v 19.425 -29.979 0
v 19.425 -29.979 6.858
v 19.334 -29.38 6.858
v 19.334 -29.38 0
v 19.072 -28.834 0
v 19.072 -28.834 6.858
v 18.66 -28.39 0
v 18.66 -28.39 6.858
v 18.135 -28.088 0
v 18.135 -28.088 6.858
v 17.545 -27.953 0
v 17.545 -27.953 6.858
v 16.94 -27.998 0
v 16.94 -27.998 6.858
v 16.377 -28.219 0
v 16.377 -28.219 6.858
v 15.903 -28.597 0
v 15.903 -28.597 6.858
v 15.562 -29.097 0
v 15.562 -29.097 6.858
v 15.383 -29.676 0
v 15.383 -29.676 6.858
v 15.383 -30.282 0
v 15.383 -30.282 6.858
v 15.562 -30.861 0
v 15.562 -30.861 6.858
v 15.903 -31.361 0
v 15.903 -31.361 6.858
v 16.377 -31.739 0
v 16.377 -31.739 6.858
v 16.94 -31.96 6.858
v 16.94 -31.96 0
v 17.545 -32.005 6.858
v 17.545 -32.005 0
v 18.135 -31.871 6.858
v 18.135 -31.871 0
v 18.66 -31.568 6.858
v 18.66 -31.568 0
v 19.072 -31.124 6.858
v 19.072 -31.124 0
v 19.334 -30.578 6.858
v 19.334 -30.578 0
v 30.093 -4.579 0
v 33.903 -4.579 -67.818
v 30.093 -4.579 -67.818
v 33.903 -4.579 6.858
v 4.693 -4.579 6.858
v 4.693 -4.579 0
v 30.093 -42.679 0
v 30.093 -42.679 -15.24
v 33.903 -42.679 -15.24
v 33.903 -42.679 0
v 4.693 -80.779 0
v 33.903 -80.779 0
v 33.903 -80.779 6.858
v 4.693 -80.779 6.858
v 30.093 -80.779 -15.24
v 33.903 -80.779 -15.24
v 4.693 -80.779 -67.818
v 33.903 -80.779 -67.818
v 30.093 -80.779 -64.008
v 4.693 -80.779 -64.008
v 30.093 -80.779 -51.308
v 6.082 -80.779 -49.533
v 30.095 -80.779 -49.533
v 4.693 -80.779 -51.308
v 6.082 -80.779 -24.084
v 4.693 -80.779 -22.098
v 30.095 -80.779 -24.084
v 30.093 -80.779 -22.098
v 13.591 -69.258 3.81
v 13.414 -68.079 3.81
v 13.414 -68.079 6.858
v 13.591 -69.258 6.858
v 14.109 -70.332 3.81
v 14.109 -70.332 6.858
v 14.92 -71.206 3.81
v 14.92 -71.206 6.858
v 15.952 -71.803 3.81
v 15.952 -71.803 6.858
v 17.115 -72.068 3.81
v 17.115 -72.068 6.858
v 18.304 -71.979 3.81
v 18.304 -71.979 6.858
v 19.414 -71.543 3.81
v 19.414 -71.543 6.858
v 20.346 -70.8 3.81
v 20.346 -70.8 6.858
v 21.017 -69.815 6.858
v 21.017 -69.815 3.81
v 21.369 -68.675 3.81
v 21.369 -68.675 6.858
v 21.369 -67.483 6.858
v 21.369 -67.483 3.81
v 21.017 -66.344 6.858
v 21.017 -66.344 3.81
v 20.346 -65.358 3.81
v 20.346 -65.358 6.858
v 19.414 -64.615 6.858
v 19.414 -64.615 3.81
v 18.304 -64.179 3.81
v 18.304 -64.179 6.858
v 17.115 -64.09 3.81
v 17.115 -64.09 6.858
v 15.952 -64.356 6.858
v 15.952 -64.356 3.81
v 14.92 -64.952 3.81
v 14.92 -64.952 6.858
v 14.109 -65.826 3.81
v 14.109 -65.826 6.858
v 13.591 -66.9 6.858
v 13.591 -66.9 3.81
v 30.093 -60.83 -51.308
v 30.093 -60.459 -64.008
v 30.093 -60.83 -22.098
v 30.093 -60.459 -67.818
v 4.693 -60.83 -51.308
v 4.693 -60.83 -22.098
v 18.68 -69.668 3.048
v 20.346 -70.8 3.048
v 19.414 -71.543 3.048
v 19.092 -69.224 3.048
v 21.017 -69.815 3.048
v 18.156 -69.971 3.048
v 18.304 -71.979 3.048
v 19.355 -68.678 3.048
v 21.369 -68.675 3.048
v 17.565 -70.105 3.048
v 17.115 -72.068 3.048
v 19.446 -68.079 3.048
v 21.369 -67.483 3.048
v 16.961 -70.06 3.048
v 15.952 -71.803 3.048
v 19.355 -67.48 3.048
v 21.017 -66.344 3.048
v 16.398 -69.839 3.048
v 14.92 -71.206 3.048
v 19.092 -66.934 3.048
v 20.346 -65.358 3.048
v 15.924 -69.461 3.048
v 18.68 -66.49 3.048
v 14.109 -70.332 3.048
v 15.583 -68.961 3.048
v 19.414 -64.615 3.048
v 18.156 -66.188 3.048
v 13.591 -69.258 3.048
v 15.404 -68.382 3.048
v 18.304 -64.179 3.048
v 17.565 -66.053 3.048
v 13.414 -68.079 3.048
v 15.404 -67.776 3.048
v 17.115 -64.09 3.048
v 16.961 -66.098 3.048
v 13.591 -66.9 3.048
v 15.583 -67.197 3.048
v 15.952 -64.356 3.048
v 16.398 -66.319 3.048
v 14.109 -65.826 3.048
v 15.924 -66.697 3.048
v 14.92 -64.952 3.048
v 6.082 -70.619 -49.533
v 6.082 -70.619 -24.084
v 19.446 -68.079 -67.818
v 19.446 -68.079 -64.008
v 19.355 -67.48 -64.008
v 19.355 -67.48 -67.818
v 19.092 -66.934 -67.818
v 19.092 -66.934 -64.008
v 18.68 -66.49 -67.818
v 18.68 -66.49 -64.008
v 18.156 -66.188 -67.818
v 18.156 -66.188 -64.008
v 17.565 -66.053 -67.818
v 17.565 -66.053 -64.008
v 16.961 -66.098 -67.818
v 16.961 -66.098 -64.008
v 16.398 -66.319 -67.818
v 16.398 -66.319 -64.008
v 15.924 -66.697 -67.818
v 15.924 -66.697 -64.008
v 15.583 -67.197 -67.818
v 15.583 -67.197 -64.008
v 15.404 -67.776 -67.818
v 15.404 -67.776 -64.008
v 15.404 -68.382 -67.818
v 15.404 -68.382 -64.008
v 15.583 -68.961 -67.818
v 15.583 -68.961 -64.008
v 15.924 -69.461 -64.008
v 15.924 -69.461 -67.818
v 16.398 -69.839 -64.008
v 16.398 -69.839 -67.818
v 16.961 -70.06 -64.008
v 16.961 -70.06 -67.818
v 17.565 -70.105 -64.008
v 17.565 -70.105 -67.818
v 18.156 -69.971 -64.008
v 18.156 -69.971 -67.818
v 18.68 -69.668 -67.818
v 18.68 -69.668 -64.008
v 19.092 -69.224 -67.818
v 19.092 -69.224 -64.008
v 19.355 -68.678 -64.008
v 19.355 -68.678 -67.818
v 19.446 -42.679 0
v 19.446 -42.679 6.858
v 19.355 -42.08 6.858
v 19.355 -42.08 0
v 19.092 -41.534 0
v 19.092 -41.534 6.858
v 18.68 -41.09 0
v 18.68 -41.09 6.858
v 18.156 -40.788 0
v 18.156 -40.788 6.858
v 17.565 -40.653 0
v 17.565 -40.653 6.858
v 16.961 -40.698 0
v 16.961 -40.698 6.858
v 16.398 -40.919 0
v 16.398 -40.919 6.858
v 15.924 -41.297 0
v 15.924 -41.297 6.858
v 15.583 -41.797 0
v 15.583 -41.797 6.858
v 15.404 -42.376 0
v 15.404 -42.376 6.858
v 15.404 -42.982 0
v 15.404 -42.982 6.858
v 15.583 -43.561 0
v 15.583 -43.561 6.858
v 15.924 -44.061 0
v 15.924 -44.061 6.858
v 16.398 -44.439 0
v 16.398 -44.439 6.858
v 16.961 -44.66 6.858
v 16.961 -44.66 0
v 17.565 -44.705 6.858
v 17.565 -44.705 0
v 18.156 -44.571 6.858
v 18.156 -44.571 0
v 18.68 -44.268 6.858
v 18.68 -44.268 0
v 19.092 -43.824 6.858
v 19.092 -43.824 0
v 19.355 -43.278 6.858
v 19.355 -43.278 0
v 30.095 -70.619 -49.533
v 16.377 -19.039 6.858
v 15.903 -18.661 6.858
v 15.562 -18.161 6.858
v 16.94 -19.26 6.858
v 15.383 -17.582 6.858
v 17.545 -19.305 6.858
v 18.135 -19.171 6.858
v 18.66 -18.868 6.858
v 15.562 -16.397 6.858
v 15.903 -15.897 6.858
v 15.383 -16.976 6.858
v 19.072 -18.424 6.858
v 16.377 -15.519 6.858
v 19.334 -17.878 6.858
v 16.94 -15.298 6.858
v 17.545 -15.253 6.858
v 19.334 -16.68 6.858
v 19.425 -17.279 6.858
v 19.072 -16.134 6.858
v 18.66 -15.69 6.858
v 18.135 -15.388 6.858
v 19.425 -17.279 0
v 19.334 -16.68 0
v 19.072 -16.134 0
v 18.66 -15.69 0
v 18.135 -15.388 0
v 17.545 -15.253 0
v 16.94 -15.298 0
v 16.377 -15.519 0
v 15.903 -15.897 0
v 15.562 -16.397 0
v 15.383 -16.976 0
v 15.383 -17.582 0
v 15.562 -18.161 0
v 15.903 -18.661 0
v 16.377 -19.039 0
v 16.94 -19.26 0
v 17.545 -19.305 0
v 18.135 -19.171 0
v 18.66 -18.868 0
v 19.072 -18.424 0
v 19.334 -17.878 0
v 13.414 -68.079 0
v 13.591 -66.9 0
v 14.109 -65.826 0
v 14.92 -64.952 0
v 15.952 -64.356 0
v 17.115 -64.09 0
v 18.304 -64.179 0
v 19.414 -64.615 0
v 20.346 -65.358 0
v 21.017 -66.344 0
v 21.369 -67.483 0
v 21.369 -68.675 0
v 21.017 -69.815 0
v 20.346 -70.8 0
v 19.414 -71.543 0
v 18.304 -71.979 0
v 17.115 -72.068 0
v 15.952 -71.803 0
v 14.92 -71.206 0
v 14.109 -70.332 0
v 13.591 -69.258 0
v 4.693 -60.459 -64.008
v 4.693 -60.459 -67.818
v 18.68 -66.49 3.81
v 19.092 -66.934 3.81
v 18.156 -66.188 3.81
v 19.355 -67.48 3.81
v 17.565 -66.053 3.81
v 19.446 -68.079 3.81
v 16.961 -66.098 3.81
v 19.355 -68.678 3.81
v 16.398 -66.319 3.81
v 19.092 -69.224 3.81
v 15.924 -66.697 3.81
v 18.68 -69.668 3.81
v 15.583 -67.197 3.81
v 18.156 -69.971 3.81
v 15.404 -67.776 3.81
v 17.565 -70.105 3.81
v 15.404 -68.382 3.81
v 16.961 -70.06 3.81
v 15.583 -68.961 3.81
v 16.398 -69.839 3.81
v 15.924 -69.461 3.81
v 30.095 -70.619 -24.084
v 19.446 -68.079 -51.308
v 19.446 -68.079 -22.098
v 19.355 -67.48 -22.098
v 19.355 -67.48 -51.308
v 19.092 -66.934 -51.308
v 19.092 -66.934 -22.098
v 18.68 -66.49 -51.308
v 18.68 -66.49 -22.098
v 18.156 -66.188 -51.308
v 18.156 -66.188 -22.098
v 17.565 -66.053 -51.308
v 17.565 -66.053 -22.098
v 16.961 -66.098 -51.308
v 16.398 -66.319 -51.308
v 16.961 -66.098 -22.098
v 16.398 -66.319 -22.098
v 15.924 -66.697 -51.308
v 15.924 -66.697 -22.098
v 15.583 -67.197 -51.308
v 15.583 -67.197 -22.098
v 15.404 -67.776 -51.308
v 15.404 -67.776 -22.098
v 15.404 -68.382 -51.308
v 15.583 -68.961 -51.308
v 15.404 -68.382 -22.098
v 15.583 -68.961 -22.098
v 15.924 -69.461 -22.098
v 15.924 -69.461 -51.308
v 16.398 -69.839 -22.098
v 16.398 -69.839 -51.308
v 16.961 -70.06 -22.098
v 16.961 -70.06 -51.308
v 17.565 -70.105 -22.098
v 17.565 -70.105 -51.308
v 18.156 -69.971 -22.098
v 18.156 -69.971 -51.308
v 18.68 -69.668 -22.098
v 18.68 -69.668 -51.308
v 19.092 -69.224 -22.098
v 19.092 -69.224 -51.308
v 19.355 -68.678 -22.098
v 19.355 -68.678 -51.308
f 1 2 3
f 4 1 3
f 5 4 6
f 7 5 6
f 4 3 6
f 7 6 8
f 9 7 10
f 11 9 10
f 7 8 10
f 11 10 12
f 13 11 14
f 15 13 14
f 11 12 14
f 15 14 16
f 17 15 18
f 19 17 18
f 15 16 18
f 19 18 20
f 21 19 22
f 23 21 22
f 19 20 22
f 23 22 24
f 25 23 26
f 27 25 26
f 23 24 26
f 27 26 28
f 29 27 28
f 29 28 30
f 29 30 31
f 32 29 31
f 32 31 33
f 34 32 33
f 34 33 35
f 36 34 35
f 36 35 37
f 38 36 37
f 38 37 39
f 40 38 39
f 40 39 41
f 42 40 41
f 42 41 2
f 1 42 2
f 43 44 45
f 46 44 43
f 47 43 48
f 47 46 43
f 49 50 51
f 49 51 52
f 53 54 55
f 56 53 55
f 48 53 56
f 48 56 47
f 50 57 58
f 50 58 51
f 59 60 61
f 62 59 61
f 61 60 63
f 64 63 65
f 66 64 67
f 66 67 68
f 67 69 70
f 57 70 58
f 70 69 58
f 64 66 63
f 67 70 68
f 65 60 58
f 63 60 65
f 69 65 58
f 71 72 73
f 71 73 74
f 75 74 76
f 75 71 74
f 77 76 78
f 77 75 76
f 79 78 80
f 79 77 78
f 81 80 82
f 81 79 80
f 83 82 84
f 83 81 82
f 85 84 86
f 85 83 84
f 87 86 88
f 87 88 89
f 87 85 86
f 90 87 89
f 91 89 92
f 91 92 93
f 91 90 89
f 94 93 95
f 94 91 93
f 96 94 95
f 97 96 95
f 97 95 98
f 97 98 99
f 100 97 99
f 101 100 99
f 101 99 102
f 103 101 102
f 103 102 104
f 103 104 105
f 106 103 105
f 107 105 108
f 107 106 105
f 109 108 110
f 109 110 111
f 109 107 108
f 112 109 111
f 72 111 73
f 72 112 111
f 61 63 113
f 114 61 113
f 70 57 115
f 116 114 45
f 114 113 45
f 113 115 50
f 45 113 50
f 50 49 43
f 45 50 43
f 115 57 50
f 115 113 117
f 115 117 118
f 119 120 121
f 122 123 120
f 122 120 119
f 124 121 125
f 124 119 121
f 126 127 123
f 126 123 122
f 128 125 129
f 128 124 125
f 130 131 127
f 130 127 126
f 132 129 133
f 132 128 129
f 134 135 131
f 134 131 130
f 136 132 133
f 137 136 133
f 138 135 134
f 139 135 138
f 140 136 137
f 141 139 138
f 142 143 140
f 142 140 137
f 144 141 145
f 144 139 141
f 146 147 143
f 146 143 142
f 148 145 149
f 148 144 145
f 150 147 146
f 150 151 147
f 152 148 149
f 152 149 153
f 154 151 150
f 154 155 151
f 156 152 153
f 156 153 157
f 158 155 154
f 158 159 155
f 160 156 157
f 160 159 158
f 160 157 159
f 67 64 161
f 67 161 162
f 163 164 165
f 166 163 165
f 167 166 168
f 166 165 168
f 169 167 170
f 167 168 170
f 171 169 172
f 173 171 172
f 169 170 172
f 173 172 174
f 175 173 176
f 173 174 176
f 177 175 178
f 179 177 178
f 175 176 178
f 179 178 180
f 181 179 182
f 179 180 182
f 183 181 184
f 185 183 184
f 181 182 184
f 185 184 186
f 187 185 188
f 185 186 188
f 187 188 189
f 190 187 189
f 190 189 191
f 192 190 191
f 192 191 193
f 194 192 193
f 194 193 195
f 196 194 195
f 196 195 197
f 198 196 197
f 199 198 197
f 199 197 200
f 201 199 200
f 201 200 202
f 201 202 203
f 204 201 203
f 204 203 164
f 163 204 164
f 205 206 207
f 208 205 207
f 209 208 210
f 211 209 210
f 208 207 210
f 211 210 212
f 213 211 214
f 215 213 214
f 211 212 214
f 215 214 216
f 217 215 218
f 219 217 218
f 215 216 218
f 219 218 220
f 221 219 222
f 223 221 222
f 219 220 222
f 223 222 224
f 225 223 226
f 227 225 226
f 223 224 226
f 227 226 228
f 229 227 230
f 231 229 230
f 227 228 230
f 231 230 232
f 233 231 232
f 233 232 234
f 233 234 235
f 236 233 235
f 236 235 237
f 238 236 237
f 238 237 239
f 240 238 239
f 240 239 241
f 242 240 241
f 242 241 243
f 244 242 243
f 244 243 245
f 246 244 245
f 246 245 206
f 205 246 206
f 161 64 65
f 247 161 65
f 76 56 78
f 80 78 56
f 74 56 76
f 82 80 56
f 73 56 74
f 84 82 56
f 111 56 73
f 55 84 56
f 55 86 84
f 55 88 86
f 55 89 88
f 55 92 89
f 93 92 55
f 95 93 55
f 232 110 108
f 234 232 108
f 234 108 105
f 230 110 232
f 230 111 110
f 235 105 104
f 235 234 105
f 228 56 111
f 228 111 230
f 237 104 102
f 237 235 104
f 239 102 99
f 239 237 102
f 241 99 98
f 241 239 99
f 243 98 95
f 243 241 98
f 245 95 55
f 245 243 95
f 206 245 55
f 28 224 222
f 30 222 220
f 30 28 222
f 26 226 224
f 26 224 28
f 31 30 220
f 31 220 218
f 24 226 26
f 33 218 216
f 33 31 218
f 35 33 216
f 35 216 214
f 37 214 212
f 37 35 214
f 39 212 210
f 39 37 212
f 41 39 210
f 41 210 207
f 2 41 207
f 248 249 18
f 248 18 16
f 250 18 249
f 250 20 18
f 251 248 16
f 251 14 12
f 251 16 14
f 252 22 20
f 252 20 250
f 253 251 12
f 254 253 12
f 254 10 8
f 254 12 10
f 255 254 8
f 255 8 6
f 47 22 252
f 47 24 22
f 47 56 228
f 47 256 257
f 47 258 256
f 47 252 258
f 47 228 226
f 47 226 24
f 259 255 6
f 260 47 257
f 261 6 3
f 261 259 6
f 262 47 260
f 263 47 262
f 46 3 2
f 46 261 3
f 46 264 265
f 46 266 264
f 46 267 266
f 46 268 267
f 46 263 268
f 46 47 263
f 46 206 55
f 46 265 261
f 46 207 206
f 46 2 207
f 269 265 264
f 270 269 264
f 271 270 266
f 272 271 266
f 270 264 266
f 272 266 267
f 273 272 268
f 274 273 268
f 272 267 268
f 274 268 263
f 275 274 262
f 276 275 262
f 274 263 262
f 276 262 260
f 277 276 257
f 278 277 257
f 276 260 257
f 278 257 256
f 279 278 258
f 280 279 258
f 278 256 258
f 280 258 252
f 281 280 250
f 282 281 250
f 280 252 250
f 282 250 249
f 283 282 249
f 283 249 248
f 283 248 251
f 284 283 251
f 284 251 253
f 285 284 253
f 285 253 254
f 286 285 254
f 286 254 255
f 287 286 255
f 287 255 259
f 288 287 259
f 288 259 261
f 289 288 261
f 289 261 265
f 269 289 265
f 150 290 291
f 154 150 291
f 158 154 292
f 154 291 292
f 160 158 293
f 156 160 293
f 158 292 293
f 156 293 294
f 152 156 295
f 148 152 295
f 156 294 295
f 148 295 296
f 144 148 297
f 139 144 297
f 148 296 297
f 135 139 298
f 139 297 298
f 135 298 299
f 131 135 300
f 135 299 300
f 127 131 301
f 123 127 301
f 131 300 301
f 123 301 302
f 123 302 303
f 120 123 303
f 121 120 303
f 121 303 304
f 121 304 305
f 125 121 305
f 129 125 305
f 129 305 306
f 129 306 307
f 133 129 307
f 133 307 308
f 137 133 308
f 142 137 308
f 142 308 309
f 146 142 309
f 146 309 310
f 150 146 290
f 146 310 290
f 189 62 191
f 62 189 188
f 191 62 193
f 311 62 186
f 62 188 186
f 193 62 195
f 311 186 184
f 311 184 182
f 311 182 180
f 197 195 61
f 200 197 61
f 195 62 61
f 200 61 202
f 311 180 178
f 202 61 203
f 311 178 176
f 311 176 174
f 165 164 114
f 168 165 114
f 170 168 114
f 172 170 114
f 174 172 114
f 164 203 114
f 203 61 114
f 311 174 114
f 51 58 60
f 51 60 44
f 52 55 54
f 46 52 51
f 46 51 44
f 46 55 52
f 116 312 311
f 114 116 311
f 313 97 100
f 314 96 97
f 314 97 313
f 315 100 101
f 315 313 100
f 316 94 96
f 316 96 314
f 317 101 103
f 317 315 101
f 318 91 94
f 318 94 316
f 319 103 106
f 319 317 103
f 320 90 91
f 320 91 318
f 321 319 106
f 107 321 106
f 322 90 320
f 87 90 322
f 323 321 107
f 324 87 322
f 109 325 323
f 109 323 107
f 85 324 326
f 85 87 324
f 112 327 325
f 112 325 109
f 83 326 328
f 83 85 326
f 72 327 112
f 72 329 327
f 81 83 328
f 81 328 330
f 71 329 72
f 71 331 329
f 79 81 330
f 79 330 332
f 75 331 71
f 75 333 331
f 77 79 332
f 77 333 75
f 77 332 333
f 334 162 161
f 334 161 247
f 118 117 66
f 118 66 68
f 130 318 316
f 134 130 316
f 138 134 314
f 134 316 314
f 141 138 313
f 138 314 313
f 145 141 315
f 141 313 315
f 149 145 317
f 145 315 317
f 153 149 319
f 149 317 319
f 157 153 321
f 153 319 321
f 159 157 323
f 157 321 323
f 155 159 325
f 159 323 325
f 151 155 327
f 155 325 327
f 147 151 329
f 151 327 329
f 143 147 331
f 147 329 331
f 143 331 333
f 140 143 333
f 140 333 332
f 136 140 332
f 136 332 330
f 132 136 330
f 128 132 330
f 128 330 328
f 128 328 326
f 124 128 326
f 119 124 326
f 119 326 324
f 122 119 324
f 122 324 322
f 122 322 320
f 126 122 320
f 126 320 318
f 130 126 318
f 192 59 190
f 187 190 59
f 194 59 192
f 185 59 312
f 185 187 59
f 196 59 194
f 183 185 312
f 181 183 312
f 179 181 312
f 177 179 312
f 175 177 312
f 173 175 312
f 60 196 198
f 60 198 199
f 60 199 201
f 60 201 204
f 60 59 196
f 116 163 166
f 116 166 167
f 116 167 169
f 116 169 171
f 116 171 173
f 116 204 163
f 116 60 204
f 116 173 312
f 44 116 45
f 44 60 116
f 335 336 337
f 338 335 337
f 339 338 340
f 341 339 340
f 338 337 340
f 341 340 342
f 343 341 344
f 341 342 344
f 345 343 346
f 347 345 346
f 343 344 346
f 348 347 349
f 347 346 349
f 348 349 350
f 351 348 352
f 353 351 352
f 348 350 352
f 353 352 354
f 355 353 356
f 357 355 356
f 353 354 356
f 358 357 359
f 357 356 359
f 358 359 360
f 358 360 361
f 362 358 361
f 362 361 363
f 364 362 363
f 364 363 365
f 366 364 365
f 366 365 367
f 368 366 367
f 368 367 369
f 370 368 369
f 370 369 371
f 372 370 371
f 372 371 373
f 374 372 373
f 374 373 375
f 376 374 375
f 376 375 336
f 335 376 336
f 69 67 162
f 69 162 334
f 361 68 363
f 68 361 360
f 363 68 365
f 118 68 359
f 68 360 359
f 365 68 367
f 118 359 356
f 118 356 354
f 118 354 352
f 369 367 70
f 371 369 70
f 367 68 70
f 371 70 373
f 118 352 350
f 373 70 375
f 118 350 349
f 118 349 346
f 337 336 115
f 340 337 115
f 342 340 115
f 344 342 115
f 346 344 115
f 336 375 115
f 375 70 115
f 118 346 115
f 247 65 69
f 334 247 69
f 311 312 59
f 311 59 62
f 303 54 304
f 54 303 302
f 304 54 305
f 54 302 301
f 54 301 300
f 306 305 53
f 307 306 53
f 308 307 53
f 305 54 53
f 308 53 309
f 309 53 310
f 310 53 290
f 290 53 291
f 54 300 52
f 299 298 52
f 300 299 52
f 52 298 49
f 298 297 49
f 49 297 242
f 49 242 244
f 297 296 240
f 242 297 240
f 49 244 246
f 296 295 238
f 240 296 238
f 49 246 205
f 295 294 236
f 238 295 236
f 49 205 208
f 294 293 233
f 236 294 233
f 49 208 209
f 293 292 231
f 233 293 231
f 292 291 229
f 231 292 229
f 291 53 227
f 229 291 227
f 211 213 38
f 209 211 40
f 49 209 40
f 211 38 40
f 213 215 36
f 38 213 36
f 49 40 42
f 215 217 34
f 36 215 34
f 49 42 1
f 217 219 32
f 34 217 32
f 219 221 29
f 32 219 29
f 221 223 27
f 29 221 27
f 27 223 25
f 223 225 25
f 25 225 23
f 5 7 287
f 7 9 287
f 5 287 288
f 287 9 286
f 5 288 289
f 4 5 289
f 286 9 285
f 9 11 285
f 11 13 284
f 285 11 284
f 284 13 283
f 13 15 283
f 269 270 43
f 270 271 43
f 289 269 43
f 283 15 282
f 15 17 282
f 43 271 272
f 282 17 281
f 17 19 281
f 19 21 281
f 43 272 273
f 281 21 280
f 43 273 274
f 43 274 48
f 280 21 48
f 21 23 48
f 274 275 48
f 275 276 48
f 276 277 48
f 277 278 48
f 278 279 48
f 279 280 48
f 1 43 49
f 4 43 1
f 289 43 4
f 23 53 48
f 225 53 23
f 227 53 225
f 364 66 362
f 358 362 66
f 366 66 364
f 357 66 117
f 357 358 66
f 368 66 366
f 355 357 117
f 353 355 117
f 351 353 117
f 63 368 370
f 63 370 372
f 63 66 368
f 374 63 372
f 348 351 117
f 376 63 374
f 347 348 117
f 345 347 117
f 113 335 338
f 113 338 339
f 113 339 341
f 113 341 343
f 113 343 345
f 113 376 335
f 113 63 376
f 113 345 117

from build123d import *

# Parameters (mm, degrees)
SKETCH1_W            = 29.21
SKETCH1_H            = 76.2
BOSS_EXTRUDE1_DEPTH  = 6.858
SKETCH3_R            = 2.032
CUT_EXTRUDE1_DEPTH   = 25.4
SKETCH17_W           = 3.81
SKETCH17_H           = 76.2
BOSS_EXTRUDE13_DEPTH = 67.818
SKETCH18_W           = 3.81
SKETCH18_H           = 20.32
BOSS_EXTRUDE14_DEPTH = 25.4
SKETCH19_W           = 29.21
SKETCH19_H           = 19.948928224
BOSS_EXTRUDE15_DEPTH = 25.4
SKETCH4_R            = 2.032
CUT_EXTRUDE5_DEPTH   = 116.113658891
SKETCH21_R           = 4
SKETCH21_R_2         = 2
CUT_EXTRUDE6_DEPTH   = 3.048
CUT_EXTRUDE7_START   = -3.048
SKETCH22_R           = 4
CUT_EXTRUDE7_DEPTH   = 3.048
SKETCH23_W           = 15.24
SKETCH23_H           = 38.1
CUT_EXTRUDE8_DEPTH   = 109.488248995
SKETCH24_W           = 24.012467883
SKETCH24_H           = 25.448429418
CUT_EXTRUDE9_DEPTH   = 10.16


with BuildPart() as part:
    # Sketch1 → Boss-Extrude1 (new body)
    with BuildSketch(Plane.XY):
        with Locations((19.297661272, -42.679075546)):
            Rectangle(SKETCH1_W, SKETCH1_H)
    extrude(amount=BOSS_EXTRUDE1_DEPTH)

    # Sketch3 → Cut-Extrude1 (cut)
    with BuildSketch(Plane.XY.offset(6.858)):
        with Locations((17.413506863, -42.679058438)):
            Circle(SKETCH3_R)
        with Locations((17.392661272, -29.979075546)):
            Circle(SKETCH3_R)
        with Locations((17.392661272, -17.279075546)):
            Circle(SKETCH3_R)
    extrude(amount=-CUT_EXTRUDE1_DEPTH, mode=Mode.SUBTRACT)

    # Sketch17 → Boss-Extrude13 (add)
    with BuildSketch(Plane(origin=(0, 0, 0), x_dir=(-1, 0, 0), z_dir=(0, 0, -1))):
        with Locations((-31.997661272, -42.679075546)):
            Rectangle(SKETCH17_W, SKETCH17_H)
    extrude(amount=BOSS_EXTRUDE13_DEPTH)

    # Sketch18 → Boss-Extrude14 (add)
    with BuildSketch(Plane.ZY.offset(-30.092661272)):
        with Locations((-65.913, -70.619075546)):
            Rectangle(SKETCH18_W, SKETCH18_H)
    extrude(amount=BOSS_EXTRUDE14_DEPTH)

    # Sketch19 → Boss-Extrude15 (add)
    with BuildSketch(Plane.ZY.offset(-30.092661272)):
        with Locations((-36.703, -70.804611434)):
            Rectangle(SKETCH19_W, SKETCH19_H)
    extrude(amount=BOSS_EXTRUDE15_DEPTH)

    # Sketch4 → Cut-Extrude5 (cut, through all)
    with BuildSketch(Plane.XY.offset(6.858)):
        with Locations((17.413506863, -68.079058438)):
            Circle(SKETCH4_R)
    extrude(amount=-CUT_EXTRUDE5_DEPTH, mode=Mode.SUBTRACT)

    # Sketch21 → Cut-Extrude6 (cut)
    with BuildSketch(Plane(origin=(0, 0, 0), x_dir=(-1, 0, 0), z_dir=(0, 0, -1))):
        with Locations((-17.413506863, -68.079058438)):
            Circle(SKETCH21_R)
        with Locations((-17.413506863, -68.079058438)):
            Circle(SKETCH21_R_2, mode=Mode.SUBTRACT)
    extrude(amount=-CUT_EXTRUDE6_DEPTH, mode=Mode.SUBTRACT)

    # Sketch22 → Cut-Extrude7 (cut)
    with BuildSketch(Plane.XY.offset(6.858).offset(CUT_EXTRUDE7_START)):
        with Locations(Location((17.413506863, -68.079058438, 0), (0, 0, 180))):
            Circle(SKETCH22_R)
    extrude(amount=CUT_EXTRUDE7_DEPTH, mode=Mode.SUBTRACT)

    # Sketch23 → Cut-Extrude8 (cut, through all)
    with BuildSketch(Plane.ZY.offset(-30.092661272)):
        with Locations((-7.62, -61.729075546)):
            Rectangle(SKETCH23_W, SKETCH23_H)
    extrude(amount=-CUT_EXTRUDE8_DEPTH, mode=Mode.SUBTRACT)

    # Sketch24 → Cut-Extrude9 (cut)
    with BuildSketch(Plane.XZ.offset(80.779075546)):
        with Locations((18.088627796, -36.808482529)):
            Rectangle(SKETCH24_W, SKETCH24_H)
    extrude(amount=-CUT_EXTRUDE9_DEPTH, mode=Mode.SUBTRACT)


solid = part.part
